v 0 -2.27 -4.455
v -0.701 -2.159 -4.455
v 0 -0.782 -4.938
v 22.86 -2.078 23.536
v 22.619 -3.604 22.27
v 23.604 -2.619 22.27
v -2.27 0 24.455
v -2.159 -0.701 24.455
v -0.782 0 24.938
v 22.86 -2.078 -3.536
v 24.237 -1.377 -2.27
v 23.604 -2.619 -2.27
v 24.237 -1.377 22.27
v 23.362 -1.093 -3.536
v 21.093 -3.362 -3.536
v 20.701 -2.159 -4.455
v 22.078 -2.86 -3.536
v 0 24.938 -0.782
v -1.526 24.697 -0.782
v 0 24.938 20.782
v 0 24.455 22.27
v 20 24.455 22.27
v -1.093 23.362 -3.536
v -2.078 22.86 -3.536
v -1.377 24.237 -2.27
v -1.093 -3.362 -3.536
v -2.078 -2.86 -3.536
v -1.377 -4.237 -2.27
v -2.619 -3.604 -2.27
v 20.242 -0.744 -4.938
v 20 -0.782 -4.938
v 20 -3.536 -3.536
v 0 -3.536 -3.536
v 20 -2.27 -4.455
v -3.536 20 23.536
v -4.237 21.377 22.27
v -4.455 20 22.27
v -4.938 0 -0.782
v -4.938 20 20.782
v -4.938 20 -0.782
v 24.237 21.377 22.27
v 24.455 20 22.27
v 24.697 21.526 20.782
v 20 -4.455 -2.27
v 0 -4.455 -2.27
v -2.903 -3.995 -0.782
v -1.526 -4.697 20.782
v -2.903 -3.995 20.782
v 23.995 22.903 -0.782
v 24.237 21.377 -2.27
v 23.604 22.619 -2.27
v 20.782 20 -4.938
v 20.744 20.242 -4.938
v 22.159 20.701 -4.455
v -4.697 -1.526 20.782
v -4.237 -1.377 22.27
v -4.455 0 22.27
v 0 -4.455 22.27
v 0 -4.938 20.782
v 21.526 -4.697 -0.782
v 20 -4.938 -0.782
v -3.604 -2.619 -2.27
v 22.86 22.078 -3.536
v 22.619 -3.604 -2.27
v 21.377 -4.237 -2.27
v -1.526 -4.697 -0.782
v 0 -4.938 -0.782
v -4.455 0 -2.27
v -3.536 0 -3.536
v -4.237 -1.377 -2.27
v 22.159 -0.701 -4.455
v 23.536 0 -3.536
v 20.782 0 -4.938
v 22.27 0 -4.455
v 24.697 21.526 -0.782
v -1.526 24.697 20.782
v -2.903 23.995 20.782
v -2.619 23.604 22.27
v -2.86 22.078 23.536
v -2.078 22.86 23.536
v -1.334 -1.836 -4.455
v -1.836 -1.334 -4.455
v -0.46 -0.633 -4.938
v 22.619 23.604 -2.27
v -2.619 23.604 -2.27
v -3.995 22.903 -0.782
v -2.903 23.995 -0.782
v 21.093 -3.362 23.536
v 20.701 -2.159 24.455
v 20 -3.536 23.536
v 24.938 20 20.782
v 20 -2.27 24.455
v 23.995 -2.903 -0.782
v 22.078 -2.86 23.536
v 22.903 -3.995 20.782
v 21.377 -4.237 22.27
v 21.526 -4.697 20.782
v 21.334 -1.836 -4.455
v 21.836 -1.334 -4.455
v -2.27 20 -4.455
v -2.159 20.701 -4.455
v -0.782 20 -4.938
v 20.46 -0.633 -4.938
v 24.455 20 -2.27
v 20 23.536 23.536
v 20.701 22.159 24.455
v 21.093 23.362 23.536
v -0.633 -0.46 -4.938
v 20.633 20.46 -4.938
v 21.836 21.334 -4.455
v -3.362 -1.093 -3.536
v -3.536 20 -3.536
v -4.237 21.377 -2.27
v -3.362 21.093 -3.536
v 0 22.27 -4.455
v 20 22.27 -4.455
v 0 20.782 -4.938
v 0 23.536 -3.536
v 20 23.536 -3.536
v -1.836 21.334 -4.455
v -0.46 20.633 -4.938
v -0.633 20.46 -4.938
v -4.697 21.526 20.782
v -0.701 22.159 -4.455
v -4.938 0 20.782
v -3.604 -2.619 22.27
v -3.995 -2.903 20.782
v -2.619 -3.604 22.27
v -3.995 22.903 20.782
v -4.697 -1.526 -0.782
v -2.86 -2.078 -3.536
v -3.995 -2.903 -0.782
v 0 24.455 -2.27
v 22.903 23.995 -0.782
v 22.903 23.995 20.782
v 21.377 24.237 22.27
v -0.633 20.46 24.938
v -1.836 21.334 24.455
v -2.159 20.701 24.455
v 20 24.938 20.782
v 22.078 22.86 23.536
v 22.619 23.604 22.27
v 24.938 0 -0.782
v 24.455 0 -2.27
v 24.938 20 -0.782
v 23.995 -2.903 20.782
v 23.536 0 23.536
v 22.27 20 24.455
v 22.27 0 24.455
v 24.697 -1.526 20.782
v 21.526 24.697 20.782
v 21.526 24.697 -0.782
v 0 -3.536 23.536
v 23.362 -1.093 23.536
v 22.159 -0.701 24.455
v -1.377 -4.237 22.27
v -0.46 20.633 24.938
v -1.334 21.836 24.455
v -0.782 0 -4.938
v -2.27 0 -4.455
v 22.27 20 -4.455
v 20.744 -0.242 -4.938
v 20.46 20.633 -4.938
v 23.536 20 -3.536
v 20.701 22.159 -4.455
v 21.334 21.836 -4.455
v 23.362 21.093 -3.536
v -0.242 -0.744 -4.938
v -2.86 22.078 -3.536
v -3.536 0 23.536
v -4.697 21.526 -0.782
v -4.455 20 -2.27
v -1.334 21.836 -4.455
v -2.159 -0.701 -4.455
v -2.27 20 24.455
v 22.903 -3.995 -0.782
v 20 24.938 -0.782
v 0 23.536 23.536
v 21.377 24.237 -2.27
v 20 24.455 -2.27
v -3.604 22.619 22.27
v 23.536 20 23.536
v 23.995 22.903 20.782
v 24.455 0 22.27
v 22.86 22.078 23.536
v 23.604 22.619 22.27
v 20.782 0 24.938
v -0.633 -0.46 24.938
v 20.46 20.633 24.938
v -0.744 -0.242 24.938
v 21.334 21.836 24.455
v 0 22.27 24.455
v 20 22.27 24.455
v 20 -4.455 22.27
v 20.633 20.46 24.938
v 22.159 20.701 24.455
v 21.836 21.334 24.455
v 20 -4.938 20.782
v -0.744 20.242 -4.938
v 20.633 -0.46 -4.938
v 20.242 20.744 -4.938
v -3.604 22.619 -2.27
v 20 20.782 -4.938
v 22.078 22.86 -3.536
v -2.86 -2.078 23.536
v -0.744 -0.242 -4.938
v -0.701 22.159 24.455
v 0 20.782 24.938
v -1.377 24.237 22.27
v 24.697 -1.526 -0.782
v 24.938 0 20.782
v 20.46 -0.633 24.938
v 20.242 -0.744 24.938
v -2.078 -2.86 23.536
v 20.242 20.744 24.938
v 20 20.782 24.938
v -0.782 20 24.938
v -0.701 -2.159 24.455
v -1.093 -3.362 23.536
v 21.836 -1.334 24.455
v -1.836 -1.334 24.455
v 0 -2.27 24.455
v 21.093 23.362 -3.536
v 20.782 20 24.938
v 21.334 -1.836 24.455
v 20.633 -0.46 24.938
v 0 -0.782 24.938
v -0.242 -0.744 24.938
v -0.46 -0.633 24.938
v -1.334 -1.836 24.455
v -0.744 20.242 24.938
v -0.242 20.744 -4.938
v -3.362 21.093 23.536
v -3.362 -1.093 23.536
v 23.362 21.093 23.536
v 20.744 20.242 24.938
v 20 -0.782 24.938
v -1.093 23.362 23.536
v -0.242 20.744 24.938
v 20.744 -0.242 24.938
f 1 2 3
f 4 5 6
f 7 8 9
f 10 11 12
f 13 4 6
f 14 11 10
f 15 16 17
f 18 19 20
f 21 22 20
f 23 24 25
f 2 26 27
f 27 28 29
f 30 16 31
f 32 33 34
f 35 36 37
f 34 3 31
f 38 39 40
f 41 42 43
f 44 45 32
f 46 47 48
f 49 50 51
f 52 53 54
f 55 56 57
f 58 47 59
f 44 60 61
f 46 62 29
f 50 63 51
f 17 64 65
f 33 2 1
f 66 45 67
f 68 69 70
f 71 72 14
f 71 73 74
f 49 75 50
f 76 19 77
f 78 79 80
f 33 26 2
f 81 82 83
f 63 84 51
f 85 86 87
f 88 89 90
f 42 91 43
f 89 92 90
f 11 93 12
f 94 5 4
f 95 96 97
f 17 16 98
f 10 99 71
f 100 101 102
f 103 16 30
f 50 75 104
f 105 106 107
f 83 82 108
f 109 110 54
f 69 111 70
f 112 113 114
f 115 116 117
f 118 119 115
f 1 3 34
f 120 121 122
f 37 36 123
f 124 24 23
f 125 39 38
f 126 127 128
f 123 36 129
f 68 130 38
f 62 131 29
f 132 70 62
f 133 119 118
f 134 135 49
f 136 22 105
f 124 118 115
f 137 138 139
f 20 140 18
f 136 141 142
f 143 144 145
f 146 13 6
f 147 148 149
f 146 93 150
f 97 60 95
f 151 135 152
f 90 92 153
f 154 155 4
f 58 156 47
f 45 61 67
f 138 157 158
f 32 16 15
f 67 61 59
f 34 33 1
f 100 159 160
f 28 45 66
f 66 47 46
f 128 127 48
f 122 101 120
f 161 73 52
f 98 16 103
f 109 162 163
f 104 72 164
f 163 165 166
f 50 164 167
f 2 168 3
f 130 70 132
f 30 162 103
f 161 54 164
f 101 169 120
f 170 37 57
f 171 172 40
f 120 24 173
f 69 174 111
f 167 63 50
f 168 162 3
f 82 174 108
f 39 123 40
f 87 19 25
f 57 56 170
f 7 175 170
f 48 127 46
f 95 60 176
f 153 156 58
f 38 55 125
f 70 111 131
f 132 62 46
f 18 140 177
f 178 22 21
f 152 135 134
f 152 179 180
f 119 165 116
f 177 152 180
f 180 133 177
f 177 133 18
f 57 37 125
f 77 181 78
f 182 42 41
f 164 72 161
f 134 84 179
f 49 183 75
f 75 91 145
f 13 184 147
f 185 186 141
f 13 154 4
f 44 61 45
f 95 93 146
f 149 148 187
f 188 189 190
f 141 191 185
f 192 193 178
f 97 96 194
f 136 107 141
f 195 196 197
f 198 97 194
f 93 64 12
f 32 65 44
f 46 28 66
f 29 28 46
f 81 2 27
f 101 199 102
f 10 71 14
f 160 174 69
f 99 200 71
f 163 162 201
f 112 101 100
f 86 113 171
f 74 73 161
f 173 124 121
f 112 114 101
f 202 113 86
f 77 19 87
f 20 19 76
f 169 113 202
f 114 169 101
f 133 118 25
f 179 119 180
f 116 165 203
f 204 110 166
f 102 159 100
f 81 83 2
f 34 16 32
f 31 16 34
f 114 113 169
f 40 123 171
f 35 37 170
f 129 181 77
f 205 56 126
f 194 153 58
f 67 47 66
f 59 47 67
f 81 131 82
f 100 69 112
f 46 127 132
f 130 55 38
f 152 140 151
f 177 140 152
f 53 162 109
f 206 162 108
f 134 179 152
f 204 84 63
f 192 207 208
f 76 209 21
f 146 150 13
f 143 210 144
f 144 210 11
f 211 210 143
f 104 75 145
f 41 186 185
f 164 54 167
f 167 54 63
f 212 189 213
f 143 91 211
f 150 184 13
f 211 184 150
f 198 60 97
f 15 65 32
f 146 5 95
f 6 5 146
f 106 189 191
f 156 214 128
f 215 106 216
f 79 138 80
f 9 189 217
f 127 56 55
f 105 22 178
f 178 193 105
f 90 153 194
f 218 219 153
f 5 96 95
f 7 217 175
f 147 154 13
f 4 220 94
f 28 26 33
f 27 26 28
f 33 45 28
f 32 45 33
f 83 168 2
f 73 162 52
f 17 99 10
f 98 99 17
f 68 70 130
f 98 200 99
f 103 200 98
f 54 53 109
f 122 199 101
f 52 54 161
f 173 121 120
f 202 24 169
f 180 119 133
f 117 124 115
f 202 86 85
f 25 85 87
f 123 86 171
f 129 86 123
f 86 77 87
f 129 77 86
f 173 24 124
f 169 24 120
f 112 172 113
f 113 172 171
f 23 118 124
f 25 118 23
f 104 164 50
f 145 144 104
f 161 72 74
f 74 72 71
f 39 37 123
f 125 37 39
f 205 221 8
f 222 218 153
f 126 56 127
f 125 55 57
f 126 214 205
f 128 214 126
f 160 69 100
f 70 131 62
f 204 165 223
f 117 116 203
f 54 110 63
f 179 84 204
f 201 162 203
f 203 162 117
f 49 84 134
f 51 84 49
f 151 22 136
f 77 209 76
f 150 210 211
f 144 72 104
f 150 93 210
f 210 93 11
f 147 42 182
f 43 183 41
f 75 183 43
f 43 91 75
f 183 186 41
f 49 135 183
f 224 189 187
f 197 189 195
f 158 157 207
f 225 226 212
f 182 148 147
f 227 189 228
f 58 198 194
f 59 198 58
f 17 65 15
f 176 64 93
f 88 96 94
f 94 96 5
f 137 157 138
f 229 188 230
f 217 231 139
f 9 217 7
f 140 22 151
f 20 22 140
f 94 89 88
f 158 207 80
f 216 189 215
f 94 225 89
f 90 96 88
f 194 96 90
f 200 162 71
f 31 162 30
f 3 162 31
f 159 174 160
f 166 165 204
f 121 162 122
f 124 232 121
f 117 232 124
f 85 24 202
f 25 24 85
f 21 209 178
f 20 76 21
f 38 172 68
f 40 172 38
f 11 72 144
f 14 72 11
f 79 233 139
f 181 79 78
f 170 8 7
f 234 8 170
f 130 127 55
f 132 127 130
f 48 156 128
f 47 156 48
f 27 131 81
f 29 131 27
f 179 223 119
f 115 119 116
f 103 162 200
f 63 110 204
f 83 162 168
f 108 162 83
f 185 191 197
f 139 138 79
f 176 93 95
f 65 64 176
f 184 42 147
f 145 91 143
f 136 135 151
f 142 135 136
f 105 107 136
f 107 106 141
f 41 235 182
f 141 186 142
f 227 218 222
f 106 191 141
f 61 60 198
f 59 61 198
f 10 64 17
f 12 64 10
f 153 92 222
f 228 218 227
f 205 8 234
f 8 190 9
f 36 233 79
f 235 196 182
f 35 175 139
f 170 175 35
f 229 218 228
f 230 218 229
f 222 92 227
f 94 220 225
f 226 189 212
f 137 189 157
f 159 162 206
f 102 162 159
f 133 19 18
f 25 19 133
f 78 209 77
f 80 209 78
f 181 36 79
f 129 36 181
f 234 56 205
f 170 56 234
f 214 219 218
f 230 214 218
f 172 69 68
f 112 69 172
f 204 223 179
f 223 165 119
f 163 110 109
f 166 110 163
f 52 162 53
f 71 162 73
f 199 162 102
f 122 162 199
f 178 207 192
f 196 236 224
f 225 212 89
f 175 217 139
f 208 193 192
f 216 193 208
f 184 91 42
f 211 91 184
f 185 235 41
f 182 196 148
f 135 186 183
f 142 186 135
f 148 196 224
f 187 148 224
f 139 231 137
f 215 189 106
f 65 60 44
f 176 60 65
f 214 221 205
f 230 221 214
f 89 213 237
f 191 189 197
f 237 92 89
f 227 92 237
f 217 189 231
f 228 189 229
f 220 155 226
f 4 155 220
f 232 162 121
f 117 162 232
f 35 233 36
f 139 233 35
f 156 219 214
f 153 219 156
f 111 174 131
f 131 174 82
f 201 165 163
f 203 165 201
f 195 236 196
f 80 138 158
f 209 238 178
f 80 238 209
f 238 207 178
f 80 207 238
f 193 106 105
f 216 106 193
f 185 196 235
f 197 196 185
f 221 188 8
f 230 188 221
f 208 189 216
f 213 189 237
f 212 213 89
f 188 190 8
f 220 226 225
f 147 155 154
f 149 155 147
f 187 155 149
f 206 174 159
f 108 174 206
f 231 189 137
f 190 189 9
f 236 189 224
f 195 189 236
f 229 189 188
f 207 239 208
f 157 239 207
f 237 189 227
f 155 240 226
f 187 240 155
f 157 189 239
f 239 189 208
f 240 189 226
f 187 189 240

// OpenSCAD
roundcube_sphere();
//roundcube_cylinder();

module roundcube_sphere() {
  minkowski($fn=20) {
    cube(20);
    sphere(5);
  }
}

module roundcube_cylinder() {
  minkowski($fn=20) {
    cube(20);
    cylinder(r=5);
  }
}
